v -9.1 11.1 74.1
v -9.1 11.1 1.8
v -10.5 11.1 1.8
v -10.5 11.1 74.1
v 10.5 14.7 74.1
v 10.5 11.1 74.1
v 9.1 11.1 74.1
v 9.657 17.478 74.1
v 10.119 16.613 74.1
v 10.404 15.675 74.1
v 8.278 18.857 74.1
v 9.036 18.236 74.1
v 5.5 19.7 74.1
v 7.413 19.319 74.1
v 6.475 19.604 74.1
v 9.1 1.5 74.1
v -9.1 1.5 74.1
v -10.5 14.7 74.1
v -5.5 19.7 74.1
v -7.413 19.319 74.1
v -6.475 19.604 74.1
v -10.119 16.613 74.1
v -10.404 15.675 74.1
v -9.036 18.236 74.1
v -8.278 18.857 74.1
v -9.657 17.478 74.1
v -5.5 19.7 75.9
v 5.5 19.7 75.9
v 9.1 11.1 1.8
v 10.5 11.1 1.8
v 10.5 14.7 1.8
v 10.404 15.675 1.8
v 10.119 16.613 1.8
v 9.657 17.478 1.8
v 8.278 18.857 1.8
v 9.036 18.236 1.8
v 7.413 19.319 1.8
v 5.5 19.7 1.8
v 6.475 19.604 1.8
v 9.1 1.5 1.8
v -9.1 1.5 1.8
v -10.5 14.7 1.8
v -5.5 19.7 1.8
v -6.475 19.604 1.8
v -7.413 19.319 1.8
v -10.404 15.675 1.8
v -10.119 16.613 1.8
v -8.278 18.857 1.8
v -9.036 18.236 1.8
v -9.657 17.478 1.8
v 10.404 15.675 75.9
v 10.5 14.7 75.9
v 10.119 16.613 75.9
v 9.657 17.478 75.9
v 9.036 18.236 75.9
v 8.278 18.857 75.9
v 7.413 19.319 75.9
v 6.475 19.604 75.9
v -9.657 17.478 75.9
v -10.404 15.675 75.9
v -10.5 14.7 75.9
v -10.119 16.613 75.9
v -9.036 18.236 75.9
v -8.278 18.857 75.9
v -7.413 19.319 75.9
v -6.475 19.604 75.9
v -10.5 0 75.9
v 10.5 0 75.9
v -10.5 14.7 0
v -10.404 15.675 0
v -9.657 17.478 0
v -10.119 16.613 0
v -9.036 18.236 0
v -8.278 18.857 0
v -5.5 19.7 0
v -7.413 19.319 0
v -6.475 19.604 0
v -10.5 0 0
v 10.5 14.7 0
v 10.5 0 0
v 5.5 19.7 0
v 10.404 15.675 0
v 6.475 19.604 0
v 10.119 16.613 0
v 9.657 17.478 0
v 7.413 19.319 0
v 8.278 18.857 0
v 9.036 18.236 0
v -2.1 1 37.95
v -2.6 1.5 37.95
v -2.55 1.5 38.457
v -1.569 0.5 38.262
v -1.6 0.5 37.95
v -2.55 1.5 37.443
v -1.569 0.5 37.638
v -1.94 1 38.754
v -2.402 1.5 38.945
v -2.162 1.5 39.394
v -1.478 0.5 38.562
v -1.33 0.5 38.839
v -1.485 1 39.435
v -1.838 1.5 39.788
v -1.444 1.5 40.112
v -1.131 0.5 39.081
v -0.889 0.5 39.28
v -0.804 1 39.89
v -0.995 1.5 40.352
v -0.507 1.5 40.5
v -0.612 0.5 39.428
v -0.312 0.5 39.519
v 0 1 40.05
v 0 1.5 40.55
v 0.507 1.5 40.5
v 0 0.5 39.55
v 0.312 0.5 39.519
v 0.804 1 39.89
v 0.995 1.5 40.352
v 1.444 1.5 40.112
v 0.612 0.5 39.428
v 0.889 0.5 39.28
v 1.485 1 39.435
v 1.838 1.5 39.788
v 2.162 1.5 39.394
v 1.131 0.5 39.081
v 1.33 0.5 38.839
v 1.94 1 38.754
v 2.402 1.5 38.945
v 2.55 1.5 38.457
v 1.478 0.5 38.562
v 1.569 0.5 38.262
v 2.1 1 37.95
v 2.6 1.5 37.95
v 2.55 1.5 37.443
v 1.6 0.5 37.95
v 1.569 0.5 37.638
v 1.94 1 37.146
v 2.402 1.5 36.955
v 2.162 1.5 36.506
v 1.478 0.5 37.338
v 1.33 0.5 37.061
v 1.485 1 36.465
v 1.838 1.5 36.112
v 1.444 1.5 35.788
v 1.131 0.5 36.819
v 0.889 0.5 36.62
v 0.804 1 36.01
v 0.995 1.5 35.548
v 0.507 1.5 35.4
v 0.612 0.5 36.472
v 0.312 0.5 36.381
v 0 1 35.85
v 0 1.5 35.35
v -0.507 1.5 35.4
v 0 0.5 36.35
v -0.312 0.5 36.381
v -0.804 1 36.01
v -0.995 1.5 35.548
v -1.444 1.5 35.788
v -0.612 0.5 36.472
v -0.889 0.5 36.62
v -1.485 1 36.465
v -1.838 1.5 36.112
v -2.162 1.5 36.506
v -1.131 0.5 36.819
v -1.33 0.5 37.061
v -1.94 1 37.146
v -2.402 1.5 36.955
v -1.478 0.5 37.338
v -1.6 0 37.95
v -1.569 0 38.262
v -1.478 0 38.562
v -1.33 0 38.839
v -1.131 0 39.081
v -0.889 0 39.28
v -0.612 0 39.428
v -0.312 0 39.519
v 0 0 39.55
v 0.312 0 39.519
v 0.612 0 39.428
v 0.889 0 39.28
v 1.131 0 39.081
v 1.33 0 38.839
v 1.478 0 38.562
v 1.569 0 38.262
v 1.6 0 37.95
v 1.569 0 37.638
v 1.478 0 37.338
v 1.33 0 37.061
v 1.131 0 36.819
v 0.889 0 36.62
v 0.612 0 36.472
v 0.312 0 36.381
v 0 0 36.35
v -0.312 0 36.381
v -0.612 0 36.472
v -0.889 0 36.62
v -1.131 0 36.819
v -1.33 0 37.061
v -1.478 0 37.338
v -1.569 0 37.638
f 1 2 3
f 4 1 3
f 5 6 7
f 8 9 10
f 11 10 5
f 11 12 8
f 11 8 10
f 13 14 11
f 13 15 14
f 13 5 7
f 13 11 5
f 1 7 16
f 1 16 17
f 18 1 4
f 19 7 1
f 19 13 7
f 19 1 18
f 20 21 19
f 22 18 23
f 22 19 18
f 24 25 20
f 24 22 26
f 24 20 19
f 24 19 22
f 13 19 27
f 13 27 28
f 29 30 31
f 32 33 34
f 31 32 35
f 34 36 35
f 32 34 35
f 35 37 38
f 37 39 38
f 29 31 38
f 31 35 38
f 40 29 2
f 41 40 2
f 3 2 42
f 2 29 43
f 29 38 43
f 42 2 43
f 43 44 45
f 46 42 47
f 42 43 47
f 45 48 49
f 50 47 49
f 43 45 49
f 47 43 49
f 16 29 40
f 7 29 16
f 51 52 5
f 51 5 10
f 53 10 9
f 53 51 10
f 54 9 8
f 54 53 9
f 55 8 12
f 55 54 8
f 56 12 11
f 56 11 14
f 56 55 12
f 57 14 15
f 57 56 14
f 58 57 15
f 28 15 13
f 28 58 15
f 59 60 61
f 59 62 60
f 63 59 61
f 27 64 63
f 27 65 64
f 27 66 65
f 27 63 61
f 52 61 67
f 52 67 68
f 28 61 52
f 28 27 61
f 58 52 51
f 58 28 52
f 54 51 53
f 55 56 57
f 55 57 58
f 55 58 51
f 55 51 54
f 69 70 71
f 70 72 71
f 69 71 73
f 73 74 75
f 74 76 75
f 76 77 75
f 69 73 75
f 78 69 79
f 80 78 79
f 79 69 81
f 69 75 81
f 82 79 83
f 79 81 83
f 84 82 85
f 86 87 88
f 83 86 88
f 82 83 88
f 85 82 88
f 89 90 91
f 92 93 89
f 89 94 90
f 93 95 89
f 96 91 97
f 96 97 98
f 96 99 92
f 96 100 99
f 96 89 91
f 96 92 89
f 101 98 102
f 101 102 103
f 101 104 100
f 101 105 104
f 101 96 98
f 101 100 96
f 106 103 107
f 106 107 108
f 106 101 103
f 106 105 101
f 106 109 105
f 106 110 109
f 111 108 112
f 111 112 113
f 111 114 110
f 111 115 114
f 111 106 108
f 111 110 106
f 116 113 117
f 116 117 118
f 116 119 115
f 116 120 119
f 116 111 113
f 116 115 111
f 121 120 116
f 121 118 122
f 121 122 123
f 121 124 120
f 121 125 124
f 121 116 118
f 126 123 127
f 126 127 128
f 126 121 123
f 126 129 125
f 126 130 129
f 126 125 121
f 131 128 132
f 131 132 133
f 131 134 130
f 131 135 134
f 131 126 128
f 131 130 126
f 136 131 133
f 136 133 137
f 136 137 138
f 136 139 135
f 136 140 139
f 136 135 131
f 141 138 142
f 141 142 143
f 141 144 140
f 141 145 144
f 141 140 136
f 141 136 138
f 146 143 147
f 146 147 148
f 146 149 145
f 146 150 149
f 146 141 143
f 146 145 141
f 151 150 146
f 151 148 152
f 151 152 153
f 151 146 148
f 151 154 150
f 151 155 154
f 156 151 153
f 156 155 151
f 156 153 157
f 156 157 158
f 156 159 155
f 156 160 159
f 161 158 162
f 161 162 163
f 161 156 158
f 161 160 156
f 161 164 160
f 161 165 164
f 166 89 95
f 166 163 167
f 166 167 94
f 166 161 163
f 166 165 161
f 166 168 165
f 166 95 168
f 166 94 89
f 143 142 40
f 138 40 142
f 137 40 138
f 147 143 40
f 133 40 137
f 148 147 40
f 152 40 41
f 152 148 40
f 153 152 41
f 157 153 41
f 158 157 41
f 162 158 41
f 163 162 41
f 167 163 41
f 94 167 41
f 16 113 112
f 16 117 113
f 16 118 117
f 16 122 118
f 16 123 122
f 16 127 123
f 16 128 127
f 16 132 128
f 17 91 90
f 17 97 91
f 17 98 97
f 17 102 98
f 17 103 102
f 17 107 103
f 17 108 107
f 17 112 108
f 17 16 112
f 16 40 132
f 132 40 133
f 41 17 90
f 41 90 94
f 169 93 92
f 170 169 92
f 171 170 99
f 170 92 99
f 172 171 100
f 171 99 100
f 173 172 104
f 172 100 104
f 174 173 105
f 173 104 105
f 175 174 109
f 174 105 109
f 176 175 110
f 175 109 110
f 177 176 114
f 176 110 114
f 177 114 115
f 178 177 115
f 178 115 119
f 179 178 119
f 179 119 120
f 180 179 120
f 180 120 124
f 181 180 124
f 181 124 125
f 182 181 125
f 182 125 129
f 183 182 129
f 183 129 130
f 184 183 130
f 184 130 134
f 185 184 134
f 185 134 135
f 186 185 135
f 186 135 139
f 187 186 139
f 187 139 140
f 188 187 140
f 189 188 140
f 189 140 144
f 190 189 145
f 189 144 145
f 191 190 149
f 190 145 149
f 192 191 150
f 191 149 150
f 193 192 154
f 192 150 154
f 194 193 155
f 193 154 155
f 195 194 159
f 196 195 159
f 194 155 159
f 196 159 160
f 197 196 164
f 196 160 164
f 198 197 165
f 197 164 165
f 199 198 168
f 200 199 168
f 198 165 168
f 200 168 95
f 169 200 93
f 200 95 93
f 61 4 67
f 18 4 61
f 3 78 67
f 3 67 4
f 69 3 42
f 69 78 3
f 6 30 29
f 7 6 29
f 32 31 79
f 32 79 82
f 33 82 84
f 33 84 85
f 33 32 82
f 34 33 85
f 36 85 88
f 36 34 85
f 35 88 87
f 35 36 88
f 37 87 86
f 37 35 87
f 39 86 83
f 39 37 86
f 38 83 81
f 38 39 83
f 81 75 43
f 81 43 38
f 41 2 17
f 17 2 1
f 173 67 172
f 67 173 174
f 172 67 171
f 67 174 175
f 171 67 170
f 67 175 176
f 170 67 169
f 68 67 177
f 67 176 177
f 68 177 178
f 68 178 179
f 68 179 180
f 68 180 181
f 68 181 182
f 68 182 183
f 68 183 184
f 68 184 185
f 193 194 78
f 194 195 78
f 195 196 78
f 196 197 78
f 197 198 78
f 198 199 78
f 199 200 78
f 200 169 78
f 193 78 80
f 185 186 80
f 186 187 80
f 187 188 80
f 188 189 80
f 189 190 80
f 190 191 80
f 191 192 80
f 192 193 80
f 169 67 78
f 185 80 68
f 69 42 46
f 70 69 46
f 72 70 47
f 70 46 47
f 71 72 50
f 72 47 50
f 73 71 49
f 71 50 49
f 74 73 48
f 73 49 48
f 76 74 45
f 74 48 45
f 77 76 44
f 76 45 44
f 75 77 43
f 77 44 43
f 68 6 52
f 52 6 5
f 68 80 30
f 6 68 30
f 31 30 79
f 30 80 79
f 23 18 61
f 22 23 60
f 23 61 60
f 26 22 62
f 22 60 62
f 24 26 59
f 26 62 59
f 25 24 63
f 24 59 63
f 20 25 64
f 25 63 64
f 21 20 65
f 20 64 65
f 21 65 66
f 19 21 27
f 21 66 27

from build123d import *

# Parameters (mm, degrees)
SKETCH_W        = 21
SKETCH_H        = 19.7
PAD_DEPTH       = 75.9
FILLET_R        = 5
SKETCH001_W     = 21
SKETCH001_H     = 72.3
POCKET_DEPTH    = 8.6
SKETCH002_W     = 18.2
SKETCH002_H     = 72.3
POCKET001_DEPTH = 9.6
SKETCH003_R     = 1.6
POCKET002_DEPTH = 5
CHAMFER_SIZE    = 1


with BuildPart() as part:
    # Sketch → Pad (new body)
    with BuildSketch(Plane.XY):
        with Locations((0, 9.85)):
            Rectangle(SKETCH_W, SKETCH_H)
    extrude(amount=PAD_DEPTH)

    # Fillet
    fillet_edges = [part.edges().sort_by_distance(p)[0] for p in [
        (-10.5, 19.7, 37.95),
        (10.5, 19.7, 37.95),
    ]]
    fillet(fillet_edges, radius=FILLET_R)

    # Sketch001 (on Face6 of Fillet) → Pocket (cut)
    with BuildSketch(Plane(origin=(0, 19.7, 0), x_dir=(-1, 0, 0), z_dir=(0, 1, 0))):
        with Locations((0, 37.95)):
            Rectangle(SKETCH001_W, SKETCH001_H)
    extrude(amount=-POCKET_DEPTH, mode=Mode.SUBTRACT)

    # Sketch002 (on Face4 of Pocket) → Pocket001 (cut)
    with BuildSketch(Plane(origin=(0, 11.1, 0), x_dir=(-1, 0, 0), z_dir=(0, 1, 0))):
        with Locations((0, 37.95)):
            Rectangle(SKETCH002_W, SKETCH002_H)
    extrude(amount=-POCKET001_DEPTH, mode=Mode.SUBTRACT)

    # Sketch003 (on Face20 of Pocket001) → Pocket002 (cut)
    with BuildSketch(Plane(origin=(0, 1.5, 0), x_dir=(-1, 0, 0), z_dir=(0, 1, 0))):
        with Locations((0, 37.95)):
            Circle(SKETCH003_R)
    extrude(amount=-POCKET002_DEPTH, mode=Mode.SUBTRACT)

    # Chamfer
    chamfer_edges = [part.edges().sort_by_distance(p)[0] for p in [
        (1.6, 1.5, 37.95),
    ]]
    chamfer(chamfer_edges, length=CHAMFER_SIZE)


solid = part.part
